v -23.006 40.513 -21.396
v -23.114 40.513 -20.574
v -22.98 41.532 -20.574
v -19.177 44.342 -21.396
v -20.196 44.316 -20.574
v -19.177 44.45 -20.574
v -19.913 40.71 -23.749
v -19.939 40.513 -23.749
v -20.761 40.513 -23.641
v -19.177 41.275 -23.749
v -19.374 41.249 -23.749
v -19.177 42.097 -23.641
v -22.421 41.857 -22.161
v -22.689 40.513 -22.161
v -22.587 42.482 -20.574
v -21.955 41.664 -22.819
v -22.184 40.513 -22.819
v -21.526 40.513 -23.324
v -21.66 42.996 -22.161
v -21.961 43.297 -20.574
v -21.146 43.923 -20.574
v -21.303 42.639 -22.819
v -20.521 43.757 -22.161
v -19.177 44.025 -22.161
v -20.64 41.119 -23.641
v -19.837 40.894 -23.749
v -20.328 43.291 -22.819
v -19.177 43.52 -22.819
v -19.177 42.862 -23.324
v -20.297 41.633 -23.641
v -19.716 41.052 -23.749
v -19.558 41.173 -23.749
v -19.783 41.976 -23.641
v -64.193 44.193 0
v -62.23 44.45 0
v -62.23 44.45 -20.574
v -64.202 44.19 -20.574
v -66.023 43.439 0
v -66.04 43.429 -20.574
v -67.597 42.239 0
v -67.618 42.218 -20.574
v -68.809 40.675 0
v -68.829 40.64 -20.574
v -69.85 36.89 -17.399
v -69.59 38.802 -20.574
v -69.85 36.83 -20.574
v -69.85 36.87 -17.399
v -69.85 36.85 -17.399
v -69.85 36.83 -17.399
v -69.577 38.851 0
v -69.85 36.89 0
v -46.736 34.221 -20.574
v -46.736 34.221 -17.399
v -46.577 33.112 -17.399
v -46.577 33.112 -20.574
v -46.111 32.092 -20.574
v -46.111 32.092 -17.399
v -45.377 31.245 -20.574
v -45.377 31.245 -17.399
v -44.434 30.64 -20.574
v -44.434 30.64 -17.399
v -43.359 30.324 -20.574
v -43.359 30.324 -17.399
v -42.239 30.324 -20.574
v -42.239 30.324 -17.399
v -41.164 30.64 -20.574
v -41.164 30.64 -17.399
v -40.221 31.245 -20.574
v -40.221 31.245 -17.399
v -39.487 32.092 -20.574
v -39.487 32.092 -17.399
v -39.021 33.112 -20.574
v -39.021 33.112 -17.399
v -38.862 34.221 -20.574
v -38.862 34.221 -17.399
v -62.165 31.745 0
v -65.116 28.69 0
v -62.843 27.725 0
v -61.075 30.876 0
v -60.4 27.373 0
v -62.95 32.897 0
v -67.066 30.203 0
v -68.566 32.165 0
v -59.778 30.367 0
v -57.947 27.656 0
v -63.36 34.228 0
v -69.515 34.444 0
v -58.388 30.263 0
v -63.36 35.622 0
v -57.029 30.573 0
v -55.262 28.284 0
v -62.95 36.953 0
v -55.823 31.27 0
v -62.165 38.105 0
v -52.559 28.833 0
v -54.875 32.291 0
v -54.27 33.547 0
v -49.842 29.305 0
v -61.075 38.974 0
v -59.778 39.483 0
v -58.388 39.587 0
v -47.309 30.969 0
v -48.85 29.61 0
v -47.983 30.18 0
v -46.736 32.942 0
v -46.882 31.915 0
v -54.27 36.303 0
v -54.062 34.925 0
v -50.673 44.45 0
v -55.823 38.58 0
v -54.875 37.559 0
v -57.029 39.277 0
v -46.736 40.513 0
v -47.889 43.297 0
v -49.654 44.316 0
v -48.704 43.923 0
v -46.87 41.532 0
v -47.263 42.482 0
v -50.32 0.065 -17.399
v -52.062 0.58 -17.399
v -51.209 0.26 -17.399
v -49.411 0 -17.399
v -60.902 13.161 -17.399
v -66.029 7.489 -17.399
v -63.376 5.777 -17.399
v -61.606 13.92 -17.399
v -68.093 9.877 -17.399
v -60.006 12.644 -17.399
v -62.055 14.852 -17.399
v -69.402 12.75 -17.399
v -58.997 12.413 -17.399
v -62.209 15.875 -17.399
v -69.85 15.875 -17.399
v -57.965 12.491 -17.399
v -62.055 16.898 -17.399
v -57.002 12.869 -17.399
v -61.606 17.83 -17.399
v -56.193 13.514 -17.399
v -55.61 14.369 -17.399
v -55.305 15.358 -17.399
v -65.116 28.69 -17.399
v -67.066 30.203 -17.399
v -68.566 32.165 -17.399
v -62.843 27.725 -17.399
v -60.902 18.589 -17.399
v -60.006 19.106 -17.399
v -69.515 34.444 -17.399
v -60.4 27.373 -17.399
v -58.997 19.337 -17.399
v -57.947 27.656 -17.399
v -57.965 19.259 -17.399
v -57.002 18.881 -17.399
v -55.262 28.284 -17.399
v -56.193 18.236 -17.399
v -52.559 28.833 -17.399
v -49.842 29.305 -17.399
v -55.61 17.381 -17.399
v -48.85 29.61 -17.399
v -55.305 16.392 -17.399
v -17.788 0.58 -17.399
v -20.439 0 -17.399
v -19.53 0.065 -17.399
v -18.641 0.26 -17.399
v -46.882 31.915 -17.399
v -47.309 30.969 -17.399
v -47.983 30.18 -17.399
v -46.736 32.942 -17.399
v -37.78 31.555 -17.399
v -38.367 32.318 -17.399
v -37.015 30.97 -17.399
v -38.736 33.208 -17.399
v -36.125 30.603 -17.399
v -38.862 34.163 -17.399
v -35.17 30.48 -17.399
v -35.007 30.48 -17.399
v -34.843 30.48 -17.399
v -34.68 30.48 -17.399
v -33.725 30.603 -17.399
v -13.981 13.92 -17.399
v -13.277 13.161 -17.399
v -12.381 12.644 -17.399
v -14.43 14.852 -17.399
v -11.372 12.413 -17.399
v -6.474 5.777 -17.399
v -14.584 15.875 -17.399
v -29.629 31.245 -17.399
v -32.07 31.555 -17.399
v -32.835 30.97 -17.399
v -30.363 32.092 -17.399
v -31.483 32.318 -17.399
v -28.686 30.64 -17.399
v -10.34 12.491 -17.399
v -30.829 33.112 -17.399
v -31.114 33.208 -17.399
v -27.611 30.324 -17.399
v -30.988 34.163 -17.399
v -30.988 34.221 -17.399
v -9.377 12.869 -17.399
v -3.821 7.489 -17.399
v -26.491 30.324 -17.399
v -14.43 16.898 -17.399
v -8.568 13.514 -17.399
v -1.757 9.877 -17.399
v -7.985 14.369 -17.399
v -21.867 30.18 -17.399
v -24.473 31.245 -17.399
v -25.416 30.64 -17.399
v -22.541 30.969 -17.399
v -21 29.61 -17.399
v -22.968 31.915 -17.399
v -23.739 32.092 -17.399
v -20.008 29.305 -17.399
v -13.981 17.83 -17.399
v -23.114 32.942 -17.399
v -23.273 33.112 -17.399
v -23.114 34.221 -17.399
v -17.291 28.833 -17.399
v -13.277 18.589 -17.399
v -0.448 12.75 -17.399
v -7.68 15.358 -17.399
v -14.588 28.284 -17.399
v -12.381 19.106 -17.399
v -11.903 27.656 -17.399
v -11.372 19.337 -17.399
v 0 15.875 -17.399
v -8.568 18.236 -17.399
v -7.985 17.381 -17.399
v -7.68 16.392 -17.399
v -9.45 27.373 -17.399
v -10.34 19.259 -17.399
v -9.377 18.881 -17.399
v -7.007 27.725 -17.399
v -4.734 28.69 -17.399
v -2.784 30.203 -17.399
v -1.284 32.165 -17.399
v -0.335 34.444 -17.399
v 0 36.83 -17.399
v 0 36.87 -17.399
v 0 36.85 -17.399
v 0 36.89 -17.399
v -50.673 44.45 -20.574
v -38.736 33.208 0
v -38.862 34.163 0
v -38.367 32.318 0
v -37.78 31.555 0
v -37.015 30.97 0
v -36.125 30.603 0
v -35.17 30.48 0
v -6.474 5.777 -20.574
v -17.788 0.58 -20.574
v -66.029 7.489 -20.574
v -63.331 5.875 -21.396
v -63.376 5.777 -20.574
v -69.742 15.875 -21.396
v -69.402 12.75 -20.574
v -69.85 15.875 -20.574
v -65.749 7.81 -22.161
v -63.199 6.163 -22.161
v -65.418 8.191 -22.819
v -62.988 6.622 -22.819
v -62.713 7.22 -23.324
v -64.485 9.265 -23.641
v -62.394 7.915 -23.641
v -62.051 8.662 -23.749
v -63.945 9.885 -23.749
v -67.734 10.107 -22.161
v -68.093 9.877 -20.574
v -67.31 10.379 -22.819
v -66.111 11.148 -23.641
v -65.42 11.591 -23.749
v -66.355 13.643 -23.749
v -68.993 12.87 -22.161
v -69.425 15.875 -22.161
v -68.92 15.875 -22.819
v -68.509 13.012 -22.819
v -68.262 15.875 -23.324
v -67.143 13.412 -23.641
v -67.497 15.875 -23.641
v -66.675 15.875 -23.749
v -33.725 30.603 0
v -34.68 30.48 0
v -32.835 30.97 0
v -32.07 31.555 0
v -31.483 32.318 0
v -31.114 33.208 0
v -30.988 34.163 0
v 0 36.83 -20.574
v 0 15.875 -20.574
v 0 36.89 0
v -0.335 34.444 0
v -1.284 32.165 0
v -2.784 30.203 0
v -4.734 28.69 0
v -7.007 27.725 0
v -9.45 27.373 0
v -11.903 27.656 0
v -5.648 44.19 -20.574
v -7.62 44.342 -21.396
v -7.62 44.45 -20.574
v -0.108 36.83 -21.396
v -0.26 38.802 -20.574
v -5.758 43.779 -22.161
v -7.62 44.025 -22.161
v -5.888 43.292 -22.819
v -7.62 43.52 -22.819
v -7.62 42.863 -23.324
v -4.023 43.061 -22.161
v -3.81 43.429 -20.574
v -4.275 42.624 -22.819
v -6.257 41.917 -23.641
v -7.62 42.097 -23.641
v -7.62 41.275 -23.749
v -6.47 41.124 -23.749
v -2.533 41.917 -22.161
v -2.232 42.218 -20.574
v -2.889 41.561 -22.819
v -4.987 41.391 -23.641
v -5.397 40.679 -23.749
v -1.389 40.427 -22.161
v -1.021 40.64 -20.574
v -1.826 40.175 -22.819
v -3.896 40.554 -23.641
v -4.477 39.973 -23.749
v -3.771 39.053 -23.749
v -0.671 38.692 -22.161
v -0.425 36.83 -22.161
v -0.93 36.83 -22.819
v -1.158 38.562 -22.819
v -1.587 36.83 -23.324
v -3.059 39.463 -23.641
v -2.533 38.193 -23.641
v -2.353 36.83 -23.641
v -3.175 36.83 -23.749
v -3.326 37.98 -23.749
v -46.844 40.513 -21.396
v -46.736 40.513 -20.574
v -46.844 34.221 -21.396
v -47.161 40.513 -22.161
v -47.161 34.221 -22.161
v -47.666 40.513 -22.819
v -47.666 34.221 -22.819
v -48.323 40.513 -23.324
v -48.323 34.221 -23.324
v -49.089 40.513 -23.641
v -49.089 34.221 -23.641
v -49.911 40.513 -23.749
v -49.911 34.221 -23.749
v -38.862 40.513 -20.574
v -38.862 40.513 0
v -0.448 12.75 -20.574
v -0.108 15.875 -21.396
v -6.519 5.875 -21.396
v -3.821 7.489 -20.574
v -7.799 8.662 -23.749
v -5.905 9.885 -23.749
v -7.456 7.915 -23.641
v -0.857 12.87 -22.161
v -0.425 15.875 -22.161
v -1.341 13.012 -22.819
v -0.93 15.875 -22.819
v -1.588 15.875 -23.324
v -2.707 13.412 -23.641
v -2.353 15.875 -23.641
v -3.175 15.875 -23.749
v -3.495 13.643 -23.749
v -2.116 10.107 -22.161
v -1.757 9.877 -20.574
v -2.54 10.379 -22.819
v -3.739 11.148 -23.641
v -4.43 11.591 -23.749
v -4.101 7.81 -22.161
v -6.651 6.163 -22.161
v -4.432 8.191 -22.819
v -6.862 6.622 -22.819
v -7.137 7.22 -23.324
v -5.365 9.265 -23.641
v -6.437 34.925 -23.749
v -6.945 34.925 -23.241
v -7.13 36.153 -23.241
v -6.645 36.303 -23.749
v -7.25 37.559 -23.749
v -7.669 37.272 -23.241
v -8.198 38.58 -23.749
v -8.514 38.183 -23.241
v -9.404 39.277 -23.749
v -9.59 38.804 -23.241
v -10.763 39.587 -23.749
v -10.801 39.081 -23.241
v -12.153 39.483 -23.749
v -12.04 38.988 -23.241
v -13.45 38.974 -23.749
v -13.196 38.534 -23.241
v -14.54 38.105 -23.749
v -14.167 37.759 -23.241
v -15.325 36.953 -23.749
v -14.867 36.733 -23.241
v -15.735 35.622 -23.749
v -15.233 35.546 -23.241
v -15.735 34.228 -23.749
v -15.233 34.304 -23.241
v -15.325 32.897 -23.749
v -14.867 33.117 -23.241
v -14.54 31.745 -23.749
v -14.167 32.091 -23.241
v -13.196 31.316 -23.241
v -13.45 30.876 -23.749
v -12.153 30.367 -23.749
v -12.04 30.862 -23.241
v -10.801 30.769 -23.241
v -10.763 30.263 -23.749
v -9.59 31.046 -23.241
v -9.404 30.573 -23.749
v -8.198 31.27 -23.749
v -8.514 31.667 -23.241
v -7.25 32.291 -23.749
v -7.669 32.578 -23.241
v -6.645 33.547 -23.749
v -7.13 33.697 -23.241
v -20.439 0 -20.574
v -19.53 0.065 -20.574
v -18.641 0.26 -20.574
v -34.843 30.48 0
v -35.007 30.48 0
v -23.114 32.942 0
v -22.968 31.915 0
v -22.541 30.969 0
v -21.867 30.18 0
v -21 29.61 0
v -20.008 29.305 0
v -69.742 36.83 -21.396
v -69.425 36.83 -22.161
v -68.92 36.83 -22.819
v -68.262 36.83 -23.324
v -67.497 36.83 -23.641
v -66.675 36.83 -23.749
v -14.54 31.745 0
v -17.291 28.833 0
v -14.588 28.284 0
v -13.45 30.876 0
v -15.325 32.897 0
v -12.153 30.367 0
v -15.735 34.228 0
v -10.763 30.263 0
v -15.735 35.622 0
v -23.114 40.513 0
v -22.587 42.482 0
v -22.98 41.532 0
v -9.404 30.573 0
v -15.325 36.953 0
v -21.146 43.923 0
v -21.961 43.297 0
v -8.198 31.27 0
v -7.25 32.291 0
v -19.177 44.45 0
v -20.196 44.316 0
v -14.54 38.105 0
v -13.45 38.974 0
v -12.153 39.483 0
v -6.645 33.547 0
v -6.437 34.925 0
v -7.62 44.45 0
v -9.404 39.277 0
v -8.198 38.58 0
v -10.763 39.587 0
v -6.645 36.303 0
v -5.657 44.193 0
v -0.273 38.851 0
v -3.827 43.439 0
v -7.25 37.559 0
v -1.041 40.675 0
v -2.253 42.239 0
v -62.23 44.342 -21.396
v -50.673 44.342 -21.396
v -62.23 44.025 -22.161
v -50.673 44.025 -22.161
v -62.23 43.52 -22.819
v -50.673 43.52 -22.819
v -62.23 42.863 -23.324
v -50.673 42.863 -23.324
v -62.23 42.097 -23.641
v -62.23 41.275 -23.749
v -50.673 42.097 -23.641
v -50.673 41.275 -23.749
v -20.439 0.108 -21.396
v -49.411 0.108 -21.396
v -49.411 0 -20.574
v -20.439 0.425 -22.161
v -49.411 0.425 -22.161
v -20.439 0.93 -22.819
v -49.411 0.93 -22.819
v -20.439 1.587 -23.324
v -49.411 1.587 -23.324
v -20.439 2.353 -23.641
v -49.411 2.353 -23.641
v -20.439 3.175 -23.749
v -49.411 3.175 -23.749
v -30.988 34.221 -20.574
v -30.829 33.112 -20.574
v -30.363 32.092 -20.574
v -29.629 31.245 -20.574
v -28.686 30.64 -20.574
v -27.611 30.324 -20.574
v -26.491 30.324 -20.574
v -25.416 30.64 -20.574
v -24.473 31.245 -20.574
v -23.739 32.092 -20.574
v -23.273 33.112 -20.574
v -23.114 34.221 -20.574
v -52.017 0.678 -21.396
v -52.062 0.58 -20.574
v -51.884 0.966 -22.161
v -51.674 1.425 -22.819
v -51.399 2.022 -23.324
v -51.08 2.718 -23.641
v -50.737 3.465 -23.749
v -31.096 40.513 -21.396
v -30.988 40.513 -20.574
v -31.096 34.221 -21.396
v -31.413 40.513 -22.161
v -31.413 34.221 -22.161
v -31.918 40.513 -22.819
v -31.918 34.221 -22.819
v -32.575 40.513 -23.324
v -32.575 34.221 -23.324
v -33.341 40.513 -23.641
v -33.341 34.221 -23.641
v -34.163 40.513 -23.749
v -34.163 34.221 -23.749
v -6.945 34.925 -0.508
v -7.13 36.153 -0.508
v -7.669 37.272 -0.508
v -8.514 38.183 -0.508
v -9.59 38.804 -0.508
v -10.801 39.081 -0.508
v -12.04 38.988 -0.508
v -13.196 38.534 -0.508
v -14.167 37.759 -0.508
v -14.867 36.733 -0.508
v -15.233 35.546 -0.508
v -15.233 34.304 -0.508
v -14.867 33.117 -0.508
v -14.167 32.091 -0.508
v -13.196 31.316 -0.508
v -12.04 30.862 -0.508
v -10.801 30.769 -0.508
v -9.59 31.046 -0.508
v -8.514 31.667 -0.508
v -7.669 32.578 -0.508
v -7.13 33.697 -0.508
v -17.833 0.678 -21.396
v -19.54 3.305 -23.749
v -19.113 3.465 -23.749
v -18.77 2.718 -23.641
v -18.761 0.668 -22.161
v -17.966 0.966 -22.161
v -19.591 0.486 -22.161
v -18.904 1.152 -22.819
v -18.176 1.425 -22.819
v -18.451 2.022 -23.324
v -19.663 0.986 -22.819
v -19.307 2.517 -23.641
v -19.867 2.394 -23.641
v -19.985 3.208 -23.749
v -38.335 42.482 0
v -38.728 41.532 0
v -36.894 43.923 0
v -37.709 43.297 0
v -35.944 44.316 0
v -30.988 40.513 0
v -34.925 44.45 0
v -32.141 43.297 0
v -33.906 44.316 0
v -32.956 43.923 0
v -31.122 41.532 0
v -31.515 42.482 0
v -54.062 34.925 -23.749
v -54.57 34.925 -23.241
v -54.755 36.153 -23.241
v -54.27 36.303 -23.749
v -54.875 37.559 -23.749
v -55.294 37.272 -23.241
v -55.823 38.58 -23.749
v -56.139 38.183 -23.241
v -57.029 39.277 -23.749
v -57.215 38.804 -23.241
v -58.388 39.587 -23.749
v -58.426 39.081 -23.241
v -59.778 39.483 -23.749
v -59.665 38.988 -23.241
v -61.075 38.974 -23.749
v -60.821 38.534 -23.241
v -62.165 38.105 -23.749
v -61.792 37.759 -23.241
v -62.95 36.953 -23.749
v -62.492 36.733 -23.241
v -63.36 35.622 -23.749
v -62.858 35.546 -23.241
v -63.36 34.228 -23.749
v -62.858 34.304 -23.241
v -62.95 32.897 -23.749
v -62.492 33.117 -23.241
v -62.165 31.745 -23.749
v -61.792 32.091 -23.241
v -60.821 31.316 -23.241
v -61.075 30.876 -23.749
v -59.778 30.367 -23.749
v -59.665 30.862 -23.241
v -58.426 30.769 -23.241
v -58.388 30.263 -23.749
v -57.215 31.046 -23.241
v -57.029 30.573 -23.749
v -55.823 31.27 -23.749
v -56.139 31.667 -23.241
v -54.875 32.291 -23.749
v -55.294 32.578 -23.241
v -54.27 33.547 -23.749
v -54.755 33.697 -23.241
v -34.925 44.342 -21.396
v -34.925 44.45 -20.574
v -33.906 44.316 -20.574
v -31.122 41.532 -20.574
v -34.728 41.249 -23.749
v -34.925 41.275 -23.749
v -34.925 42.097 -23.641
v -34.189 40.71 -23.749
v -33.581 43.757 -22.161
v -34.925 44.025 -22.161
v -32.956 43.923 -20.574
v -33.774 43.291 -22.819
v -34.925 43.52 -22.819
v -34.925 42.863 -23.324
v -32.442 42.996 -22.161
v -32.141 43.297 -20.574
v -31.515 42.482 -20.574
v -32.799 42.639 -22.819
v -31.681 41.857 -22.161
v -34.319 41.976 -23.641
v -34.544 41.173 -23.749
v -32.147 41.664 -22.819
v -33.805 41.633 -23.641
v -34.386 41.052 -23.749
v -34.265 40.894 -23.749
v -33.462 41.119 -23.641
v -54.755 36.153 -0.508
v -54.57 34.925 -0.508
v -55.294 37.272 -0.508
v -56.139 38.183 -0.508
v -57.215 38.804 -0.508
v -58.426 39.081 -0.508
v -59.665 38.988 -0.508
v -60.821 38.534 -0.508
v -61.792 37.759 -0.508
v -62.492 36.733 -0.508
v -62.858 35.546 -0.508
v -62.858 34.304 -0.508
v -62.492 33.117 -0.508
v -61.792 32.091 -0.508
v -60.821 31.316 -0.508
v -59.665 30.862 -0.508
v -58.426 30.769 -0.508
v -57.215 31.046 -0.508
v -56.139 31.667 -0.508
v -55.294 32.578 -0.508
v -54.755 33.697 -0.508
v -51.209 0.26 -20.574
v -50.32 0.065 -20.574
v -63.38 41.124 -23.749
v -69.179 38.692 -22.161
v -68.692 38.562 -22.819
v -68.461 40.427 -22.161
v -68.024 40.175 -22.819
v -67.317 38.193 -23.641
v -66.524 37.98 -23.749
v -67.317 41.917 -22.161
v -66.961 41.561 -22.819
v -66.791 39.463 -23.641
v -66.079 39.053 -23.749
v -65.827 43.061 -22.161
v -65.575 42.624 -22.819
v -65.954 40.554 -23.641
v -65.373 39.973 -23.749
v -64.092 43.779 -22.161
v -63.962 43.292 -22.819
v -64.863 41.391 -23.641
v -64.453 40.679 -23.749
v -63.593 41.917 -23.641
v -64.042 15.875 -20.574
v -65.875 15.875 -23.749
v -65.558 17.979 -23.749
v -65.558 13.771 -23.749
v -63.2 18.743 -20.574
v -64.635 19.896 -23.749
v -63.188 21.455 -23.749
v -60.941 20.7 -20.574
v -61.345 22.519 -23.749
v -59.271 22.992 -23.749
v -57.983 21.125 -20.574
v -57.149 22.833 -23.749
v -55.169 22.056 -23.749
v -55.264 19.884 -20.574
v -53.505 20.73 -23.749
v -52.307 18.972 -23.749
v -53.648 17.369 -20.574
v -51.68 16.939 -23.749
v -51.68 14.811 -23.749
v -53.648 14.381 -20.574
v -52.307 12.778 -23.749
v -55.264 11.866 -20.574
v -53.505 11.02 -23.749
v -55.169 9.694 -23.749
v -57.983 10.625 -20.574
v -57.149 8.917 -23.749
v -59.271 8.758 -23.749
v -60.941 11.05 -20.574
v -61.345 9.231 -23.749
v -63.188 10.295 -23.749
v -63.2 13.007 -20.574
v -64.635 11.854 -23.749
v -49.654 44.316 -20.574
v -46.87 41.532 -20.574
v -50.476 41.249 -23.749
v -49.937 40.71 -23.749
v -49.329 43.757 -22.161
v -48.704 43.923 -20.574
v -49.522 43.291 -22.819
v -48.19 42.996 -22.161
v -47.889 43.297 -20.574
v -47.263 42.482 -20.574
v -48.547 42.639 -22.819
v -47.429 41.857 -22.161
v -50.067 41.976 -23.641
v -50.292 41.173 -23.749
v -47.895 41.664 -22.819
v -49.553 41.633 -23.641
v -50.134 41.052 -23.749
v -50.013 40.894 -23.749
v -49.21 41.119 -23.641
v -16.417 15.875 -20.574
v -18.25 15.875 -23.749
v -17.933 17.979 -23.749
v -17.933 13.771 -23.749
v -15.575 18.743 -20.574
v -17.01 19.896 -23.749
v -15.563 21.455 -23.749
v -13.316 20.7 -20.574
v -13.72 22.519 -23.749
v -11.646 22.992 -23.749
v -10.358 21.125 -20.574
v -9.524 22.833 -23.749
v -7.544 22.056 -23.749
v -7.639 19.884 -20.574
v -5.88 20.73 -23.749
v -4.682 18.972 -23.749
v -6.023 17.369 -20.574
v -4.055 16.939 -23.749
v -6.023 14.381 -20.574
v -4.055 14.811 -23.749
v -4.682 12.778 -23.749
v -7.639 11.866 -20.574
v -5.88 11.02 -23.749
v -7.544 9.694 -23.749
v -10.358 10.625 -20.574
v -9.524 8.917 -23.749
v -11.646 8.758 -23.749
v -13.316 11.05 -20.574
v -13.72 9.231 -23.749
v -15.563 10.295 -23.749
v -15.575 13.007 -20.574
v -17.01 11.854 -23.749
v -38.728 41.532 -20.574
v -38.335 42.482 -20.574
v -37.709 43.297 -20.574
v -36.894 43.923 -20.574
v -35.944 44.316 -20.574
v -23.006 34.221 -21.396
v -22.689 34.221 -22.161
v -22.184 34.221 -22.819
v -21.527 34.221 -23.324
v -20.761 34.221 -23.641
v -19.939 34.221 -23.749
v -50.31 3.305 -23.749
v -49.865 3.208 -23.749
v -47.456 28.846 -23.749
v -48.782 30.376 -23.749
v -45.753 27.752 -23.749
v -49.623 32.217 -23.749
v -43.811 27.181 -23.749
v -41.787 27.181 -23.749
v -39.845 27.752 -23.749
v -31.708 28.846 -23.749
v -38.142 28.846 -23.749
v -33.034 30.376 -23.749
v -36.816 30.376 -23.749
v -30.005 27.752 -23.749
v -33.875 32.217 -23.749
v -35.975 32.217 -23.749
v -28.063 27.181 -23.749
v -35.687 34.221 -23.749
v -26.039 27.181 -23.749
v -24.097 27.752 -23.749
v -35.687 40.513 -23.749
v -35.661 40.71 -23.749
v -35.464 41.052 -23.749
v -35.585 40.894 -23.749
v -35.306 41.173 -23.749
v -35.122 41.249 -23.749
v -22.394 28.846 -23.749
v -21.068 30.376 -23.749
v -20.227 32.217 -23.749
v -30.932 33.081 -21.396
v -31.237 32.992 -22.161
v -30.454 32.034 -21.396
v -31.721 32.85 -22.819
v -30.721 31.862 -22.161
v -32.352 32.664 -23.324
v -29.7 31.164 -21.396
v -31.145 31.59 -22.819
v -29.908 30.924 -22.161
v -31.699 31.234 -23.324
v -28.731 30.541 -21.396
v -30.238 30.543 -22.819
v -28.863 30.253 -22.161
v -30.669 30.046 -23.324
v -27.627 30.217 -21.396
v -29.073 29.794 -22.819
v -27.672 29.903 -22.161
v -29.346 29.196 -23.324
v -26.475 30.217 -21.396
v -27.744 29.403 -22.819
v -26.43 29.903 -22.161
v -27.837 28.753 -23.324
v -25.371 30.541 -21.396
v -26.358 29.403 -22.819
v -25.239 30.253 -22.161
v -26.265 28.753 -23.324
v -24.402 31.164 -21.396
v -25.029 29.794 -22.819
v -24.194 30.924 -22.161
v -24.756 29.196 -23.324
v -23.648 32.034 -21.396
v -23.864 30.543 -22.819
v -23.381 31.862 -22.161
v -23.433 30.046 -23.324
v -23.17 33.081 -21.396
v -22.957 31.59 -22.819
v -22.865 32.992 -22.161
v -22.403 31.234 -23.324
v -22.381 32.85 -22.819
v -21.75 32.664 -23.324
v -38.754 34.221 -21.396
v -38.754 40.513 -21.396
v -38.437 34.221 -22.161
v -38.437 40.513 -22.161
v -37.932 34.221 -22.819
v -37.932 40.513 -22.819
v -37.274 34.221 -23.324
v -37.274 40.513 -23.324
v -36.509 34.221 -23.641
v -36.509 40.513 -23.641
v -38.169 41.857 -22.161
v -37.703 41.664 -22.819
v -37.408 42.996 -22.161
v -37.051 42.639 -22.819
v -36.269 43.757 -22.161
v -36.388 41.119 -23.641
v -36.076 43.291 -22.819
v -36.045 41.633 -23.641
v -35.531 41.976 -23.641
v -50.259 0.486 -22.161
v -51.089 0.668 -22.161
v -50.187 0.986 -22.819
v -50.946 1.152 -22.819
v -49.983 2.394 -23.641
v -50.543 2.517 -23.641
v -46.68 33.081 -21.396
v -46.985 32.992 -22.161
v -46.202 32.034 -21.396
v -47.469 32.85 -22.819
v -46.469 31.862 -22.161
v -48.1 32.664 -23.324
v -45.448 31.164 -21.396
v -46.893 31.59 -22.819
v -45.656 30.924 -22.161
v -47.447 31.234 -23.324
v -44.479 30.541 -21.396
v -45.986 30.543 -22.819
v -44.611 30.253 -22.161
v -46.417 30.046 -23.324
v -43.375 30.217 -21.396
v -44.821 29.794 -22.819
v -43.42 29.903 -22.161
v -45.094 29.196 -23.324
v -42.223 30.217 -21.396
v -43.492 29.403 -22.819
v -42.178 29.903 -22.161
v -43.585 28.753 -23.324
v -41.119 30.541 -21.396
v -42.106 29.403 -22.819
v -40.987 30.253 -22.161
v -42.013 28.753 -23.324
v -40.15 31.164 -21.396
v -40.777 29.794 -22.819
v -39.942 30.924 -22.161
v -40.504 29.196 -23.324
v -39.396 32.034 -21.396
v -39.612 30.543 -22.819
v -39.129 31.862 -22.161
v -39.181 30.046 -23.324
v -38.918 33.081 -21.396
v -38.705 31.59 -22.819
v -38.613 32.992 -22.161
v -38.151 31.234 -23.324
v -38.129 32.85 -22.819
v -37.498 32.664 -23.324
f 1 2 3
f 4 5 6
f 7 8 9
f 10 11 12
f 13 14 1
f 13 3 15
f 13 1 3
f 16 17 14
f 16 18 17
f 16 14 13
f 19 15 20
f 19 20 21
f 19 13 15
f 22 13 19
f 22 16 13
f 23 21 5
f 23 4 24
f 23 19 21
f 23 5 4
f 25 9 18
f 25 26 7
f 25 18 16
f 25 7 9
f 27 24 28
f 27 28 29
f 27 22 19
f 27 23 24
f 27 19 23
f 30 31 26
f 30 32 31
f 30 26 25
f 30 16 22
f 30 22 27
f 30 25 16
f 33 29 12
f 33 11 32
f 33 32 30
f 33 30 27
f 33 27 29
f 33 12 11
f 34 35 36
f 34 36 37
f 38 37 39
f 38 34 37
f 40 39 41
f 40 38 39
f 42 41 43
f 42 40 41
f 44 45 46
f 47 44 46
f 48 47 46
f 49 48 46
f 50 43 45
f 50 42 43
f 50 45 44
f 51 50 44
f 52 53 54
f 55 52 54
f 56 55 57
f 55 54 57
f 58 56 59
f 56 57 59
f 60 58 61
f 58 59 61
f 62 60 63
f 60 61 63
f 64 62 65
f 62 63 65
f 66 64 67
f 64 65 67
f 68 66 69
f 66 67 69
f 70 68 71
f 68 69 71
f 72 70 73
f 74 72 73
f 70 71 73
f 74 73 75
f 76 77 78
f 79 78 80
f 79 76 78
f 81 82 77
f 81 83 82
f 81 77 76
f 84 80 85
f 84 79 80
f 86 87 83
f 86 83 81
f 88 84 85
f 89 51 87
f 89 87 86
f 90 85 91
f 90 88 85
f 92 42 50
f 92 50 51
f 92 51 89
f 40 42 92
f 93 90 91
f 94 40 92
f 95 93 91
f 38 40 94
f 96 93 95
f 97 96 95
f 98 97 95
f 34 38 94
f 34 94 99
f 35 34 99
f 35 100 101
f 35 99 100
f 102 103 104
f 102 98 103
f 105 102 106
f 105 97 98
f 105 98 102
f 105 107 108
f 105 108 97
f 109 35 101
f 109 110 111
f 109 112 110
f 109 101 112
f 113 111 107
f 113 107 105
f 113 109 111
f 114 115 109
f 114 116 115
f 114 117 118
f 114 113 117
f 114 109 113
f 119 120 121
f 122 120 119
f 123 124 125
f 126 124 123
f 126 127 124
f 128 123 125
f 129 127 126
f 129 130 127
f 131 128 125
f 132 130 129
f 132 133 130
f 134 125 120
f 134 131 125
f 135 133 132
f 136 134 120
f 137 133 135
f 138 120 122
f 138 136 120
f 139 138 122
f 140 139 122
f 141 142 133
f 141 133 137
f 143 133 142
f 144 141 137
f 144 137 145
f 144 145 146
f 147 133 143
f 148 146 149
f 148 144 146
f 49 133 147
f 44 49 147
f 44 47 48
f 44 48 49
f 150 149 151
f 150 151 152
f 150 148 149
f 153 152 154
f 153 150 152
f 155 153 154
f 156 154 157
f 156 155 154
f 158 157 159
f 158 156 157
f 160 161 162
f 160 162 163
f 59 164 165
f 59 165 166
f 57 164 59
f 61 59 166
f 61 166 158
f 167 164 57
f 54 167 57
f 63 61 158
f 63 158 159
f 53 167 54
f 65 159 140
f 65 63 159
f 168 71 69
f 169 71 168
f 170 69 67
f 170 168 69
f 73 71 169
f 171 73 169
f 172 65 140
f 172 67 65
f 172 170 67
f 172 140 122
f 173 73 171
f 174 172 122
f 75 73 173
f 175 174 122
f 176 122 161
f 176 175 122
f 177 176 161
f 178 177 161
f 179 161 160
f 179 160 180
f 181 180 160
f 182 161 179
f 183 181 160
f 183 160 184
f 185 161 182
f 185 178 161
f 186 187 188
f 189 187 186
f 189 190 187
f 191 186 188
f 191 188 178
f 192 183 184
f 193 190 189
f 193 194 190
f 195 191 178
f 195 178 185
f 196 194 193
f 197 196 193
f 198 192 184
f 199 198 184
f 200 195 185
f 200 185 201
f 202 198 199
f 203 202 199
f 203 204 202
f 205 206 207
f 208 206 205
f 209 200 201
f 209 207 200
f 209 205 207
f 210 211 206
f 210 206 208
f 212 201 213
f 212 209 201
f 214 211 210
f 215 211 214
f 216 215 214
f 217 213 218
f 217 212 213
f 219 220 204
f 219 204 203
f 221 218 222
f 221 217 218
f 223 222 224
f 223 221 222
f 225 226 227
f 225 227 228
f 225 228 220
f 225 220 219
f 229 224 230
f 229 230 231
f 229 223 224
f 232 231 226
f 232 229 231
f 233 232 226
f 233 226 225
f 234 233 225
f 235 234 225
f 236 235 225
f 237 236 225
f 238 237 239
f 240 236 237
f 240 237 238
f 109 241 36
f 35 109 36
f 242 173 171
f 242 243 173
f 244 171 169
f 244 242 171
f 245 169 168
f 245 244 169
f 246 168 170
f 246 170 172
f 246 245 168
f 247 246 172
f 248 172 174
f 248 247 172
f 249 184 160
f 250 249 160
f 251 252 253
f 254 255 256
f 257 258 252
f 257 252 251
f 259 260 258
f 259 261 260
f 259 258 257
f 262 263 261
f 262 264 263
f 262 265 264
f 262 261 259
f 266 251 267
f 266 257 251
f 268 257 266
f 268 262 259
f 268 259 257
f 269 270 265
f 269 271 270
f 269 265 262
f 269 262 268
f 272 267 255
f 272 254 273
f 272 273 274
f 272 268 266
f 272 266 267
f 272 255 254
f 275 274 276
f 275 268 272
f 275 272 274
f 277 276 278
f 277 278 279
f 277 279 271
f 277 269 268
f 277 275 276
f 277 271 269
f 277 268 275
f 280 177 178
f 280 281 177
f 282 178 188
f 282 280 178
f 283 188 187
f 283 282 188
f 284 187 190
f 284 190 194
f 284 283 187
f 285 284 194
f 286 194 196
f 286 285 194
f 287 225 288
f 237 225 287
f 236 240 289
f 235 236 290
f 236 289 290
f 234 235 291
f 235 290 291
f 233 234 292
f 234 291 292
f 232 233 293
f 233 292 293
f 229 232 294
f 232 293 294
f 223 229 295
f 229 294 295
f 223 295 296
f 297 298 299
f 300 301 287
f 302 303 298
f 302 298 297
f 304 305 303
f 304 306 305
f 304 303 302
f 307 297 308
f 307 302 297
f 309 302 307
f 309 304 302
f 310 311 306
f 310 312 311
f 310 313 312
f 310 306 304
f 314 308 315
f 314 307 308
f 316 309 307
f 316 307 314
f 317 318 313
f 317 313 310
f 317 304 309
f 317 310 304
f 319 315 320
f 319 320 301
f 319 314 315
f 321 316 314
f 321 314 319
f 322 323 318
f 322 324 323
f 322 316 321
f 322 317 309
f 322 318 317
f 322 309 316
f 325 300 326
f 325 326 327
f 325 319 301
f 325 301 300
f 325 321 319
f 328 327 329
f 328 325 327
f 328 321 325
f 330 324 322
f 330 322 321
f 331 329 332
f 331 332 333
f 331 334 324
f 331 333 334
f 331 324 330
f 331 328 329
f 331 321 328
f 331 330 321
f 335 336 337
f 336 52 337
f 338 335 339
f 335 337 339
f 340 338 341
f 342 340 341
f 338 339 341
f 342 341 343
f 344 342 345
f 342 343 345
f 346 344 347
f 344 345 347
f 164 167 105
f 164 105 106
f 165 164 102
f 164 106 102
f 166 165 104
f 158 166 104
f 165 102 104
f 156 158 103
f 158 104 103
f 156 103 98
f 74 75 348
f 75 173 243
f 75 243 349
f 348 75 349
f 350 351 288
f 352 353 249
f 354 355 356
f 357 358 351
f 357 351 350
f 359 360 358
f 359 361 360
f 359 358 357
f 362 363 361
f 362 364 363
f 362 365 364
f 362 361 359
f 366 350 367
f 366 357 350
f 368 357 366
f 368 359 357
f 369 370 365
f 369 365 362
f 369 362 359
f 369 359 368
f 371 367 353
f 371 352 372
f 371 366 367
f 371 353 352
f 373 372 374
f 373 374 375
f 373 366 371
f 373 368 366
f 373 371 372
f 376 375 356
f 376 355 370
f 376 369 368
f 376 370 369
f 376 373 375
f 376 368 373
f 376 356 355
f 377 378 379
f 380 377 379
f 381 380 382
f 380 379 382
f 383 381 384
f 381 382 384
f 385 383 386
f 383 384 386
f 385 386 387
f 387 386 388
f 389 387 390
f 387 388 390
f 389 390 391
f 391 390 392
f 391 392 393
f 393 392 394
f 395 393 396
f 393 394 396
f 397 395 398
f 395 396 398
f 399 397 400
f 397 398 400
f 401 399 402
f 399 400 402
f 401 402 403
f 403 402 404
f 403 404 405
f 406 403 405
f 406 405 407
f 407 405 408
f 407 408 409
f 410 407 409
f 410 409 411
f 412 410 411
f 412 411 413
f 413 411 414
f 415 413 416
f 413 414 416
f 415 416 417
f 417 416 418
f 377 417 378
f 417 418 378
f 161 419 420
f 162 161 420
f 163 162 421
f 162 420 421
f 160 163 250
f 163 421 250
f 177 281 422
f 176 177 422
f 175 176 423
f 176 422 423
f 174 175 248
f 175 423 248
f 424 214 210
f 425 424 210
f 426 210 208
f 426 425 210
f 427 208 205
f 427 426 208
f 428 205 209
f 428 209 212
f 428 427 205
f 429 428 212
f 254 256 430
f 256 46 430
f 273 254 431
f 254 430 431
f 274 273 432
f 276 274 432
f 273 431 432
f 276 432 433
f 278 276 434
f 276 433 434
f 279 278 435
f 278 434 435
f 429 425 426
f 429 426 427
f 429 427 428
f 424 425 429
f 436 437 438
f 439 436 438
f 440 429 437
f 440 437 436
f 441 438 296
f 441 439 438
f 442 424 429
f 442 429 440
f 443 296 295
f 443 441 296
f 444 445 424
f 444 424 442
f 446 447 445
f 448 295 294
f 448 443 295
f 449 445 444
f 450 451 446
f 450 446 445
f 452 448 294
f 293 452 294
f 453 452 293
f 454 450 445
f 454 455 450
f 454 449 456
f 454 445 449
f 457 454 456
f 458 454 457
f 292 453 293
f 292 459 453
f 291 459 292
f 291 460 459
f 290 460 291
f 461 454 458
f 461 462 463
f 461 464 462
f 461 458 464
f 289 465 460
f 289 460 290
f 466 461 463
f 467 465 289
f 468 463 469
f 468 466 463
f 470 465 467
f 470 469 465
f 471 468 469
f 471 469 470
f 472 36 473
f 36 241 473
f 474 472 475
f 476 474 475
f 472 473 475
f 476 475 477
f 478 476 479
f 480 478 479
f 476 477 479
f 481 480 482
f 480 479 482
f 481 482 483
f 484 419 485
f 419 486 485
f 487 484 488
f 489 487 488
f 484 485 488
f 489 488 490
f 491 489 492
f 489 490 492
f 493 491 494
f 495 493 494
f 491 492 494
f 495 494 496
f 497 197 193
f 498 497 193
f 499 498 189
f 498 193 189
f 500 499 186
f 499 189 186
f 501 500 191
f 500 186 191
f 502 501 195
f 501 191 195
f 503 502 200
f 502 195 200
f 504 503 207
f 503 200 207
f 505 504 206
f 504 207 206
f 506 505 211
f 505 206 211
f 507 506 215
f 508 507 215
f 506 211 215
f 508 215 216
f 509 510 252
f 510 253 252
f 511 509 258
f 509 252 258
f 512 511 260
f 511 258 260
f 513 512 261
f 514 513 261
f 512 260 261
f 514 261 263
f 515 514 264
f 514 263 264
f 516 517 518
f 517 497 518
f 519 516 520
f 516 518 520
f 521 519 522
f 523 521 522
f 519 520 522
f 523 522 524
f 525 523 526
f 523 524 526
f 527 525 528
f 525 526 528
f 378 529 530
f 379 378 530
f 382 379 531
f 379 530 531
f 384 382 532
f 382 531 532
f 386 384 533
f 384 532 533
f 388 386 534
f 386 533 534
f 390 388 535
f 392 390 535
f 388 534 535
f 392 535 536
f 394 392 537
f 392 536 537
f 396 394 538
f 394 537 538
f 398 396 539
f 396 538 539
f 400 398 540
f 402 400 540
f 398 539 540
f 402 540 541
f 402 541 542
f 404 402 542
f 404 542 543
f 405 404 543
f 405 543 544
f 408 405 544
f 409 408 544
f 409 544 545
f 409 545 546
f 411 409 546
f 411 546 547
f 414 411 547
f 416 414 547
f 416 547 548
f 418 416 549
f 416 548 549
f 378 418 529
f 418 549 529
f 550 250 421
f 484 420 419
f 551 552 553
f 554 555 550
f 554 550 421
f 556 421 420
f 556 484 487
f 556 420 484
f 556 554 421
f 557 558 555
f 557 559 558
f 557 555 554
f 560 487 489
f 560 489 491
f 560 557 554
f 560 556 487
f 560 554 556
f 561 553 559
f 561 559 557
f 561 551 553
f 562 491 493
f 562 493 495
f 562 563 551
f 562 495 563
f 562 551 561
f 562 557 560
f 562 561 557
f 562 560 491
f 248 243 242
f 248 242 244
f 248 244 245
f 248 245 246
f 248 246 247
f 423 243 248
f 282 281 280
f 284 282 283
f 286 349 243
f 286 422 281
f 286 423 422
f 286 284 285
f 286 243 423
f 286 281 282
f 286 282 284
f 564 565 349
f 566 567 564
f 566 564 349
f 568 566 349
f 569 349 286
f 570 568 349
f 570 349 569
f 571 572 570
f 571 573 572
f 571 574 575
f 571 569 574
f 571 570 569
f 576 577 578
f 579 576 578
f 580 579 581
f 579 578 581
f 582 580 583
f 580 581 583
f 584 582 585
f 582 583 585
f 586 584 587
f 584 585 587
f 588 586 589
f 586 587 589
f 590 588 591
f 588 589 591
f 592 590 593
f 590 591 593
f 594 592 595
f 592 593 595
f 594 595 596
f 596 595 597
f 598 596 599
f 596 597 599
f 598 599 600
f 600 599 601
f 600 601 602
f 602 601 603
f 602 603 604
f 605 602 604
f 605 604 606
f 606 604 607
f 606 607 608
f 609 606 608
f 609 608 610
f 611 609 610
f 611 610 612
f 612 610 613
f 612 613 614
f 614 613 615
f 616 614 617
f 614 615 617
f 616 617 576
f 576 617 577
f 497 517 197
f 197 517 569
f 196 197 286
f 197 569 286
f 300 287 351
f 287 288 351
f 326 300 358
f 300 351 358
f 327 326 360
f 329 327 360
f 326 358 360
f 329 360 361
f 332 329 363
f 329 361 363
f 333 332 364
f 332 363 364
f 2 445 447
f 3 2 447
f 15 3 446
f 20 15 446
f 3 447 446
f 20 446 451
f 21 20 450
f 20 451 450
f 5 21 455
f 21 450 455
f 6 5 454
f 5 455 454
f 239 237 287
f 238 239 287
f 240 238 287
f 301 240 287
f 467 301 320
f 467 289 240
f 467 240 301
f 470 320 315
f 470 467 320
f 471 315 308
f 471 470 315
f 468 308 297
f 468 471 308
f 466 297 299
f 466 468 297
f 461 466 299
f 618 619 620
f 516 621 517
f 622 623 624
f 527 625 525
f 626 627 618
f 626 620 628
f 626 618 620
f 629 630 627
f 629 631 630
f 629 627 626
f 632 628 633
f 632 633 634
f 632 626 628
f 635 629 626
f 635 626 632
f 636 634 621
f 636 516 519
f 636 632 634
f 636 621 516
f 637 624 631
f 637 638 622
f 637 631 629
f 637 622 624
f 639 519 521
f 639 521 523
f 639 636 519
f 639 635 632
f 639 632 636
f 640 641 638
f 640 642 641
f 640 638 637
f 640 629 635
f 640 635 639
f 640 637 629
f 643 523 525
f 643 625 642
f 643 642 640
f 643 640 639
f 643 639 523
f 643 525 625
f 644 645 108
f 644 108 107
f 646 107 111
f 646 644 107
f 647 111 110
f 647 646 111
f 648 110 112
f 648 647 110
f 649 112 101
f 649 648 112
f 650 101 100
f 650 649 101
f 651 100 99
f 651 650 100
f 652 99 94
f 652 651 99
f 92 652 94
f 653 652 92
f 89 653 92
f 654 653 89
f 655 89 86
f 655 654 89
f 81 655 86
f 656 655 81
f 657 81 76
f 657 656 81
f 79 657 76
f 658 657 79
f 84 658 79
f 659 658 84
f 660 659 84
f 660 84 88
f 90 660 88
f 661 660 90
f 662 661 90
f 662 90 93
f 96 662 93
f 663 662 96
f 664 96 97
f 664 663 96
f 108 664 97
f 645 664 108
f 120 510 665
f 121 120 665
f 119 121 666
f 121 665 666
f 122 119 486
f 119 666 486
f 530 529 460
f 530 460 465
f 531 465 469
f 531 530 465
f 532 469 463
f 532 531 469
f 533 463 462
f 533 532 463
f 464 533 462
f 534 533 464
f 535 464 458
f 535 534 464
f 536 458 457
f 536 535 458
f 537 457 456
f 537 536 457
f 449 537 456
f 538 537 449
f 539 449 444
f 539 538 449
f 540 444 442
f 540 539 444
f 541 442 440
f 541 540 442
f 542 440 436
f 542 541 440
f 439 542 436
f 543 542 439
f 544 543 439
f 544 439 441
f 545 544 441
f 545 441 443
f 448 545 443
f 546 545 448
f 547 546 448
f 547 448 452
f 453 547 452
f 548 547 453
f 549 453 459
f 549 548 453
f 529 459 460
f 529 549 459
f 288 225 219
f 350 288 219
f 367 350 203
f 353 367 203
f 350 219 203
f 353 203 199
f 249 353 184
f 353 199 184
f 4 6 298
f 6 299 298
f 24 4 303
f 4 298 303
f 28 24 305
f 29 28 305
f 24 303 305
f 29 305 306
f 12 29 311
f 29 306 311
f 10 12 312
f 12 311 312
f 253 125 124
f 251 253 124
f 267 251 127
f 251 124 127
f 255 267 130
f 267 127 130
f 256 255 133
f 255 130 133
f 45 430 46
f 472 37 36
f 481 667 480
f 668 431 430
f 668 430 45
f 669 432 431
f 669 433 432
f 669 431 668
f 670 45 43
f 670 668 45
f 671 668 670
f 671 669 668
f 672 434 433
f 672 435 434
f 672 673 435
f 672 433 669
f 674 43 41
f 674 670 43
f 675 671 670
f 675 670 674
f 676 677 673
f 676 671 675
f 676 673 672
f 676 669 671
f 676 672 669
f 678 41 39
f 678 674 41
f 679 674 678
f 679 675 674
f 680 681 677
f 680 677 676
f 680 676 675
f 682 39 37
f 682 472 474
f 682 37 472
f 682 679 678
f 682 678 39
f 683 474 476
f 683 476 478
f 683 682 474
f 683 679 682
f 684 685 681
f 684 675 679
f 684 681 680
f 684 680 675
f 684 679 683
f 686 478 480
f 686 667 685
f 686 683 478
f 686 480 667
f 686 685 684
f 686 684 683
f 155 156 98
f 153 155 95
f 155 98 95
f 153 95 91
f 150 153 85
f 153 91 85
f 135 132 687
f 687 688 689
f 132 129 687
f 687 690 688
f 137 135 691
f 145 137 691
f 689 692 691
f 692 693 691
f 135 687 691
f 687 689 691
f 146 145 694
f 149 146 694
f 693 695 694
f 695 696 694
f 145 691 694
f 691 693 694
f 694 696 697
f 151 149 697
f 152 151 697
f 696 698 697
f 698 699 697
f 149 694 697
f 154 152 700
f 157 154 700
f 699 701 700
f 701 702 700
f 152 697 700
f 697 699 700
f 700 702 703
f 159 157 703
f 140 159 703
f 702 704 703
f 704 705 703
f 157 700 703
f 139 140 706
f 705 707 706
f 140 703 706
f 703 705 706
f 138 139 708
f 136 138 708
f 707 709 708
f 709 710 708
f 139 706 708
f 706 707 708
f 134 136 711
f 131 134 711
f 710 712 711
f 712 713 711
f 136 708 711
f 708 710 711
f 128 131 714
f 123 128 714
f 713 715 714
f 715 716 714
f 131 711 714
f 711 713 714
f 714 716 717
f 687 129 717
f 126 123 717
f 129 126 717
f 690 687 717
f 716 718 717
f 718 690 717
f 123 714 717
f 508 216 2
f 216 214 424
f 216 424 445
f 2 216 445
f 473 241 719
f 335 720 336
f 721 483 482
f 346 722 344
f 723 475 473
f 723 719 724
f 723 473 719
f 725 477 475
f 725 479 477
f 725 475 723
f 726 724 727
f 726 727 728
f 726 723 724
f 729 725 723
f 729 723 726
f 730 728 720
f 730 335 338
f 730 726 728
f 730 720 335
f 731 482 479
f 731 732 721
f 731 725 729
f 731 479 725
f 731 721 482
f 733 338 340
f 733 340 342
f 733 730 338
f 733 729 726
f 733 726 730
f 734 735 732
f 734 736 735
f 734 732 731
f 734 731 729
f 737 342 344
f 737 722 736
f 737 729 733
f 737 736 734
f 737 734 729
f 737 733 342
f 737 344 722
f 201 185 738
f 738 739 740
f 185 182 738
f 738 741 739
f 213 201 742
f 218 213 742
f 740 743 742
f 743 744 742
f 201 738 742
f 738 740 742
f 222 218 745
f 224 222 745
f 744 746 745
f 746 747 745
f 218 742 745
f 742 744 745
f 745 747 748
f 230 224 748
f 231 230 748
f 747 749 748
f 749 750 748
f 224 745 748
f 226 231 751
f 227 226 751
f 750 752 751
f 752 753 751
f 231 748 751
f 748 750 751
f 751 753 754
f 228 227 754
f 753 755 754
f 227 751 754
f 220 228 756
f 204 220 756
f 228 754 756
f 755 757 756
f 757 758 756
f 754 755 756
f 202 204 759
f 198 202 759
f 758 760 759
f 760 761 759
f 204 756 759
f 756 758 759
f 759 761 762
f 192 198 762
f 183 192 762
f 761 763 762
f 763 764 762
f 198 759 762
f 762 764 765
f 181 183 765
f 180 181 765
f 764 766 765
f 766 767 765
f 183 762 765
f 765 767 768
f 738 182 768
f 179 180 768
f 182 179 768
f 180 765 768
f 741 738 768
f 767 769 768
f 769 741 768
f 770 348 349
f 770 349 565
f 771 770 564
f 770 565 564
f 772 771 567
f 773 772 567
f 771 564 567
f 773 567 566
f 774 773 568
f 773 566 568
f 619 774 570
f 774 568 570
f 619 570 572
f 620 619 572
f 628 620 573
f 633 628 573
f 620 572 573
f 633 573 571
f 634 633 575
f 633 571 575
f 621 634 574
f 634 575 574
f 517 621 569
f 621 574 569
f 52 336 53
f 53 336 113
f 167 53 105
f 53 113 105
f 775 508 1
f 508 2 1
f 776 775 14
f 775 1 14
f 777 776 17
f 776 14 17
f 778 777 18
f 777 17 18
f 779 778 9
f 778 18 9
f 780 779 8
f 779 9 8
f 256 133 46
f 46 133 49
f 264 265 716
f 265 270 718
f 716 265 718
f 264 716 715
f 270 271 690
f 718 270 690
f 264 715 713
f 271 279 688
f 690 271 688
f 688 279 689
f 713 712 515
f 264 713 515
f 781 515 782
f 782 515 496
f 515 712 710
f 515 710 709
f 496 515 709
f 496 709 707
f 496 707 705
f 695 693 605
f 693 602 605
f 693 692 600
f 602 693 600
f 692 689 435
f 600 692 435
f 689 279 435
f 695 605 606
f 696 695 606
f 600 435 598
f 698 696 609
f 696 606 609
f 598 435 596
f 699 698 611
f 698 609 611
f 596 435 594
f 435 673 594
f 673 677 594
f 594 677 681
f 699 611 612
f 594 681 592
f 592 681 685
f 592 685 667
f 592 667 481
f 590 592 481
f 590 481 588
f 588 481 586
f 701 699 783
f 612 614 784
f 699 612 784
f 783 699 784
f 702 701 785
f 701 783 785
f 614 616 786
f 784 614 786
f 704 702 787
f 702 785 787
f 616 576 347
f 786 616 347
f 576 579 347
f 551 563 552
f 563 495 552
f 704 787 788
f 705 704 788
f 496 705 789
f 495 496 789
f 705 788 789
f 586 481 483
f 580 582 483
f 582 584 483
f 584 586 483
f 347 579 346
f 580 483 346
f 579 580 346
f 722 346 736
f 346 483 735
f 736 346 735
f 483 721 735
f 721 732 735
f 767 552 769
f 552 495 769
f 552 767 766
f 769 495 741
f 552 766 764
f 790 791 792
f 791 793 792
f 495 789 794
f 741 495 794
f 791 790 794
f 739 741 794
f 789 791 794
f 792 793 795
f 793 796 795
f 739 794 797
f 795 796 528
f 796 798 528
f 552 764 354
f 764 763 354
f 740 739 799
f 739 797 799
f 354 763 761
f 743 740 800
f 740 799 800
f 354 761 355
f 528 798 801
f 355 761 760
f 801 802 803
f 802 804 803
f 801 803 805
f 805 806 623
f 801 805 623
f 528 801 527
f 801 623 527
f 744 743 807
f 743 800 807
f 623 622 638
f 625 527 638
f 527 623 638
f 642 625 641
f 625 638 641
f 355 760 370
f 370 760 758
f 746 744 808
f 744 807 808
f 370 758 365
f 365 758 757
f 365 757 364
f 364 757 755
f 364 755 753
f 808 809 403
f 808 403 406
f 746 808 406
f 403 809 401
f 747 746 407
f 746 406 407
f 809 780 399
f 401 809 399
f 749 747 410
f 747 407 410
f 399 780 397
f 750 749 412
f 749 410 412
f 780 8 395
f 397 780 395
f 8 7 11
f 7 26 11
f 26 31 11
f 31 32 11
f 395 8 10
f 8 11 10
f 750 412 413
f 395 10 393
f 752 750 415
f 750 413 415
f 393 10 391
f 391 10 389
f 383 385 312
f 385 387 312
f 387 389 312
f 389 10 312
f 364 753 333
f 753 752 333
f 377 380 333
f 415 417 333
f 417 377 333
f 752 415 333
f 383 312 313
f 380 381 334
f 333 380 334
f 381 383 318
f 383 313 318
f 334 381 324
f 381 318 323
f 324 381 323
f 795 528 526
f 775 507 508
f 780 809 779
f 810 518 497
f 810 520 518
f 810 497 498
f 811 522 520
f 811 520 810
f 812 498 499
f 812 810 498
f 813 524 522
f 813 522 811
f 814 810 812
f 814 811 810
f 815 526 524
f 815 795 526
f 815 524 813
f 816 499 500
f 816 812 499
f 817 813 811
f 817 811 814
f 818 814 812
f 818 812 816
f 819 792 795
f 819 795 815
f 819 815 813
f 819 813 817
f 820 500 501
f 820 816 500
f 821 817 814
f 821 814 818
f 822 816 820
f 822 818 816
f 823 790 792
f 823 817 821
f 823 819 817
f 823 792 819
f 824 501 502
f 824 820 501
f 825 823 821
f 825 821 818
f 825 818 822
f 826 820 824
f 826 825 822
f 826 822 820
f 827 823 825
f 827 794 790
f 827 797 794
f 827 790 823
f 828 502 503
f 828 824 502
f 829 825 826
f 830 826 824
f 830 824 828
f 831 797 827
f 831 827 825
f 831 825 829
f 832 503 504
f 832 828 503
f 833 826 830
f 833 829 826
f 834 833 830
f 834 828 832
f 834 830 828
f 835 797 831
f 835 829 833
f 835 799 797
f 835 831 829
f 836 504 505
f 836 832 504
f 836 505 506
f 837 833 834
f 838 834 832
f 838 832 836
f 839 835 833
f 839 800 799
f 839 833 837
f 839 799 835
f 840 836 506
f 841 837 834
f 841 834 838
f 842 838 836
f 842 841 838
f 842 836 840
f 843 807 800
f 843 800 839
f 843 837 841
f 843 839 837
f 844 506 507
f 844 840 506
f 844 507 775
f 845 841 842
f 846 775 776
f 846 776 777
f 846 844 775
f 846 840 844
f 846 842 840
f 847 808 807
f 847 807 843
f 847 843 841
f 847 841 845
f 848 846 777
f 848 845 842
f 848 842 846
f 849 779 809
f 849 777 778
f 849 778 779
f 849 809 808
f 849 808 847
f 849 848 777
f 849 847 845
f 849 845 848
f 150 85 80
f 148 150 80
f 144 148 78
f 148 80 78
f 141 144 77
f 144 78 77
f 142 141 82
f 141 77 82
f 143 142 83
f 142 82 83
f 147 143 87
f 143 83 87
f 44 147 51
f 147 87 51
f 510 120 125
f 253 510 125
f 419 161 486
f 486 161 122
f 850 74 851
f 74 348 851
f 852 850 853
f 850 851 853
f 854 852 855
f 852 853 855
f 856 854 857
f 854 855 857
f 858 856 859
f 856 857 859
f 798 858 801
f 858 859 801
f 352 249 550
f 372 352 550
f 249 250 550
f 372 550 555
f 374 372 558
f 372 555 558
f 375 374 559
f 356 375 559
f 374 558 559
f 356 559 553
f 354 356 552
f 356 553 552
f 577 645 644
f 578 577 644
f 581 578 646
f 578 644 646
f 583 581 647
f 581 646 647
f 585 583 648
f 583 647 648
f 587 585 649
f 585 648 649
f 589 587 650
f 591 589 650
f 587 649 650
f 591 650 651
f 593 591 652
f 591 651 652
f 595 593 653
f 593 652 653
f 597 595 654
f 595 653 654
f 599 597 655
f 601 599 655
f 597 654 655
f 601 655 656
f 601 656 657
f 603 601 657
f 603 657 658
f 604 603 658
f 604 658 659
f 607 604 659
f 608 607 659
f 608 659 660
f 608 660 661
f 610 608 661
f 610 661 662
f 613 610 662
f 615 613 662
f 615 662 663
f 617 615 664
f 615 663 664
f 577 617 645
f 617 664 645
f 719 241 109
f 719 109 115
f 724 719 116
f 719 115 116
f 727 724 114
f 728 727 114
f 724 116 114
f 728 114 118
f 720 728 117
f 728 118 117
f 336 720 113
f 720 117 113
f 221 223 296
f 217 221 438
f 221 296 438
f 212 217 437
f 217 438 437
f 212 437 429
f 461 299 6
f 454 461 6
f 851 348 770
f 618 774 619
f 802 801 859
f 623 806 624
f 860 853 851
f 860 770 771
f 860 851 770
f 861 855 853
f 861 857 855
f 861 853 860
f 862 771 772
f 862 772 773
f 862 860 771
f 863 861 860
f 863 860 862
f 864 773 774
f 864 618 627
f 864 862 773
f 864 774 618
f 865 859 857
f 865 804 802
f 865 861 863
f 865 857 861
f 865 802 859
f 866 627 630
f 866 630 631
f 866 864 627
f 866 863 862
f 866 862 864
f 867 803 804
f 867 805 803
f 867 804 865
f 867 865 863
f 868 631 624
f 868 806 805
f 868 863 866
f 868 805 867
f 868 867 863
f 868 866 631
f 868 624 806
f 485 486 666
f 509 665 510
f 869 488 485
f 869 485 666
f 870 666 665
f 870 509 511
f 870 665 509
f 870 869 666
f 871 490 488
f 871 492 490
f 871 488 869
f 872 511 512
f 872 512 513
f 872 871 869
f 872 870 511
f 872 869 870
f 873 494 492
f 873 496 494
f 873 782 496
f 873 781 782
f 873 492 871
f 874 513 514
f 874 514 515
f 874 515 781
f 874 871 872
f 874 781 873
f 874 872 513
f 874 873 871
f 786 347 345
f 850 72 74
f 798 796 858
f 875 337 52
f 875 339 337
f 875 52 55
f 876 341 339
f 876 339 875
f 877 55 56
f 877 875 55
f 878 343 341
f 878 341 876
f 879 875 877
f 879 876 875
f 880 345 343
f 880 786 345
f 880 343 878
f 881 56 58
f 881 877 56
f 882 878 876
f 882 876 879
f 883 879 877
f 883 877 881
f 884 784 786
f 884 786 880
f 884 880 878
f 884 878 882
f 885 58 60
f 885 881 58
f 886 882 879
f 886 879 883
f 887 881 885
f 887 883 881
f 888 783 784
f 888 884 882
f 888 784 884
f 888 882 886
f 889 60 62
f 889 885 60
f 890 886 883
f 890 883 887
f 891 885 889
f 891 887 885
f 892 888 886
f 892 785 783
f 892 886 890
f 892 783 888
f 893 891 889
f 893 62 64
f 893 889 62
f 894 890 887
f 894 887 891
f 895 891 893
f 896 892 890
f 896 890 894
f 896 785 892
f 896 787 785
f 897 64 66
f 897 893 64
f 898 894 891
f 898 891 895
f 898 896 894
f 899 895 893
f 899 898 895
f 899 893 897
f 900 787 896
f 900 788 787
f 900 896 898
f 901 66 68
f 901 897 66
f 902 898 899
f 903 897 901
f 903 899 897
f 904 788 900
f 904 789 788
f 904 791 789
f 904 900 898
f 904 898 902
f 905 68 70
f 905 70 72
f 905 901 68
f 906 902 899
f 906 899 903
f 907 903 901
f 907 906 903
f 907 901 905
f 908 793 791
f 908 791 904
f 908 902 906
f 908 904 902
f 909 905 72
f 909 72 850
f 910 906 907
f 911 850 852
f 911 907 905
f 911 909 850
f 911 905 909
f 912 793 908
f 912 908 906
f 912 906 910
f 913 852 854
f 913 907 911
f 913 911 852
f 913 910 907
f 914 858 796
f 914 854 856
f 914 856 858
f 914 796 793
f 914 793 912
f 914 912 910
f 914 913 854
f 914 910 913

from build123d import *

# Parameters (mm, degrees)
SKETCH1_W                    = 69.85
SKETCH1_H                    = 44.45
SKETCH1_R                    = 4.1671875
BOSS_EXTRUDE1_DEPTH          = 23.749
CUT_EXTRUDE1_DEPTH           = 17.399
SKETCH3_OUTSIDE_W            = 89.076
SKETCH3_OUTSIDE_H            = 63.676
CUT_EXTRUDE2_DEPTH           = 23.749
SKETCH4_OUTSIDE_W            = 89.076
SKETCH4_OUTSIDE_H            = 63.676
CUT_EXTRUDE3_DEPTH           = 6.35
CUT_EXTRUDE4_DEPTH           = 87.132688342
SKETCH6_R                    = 7.1374
CUT_EXTRUDE6_DEPTH           = 6.35
CUT_EXTRUDE6_DRAFT           = -30
CUT_EXTRUDE6_PROFILE_2_DEPTH = 6.35
CUT_EXTRUDE6_PROFILE_2_DRAFT = -30
SKETCH7_W                    = 7.874
SKETCH7_H                    = 9.578750354
CUT_EXTRUDE7_DEPTH           = 85.602306121
FILLET2_R                    = 3.683
CHAMFER1_SIZE                = 0.508
FILLET3_R                    = 6.35
FILLET4_R                    = 3.175


with BuildPart() as part:
    # Sketch1 → Boss-Extrude1 (new body)
    with BuildSketch(Plane.XY):
        with Locations((-34.925, 22.225)):
            Rectangle(SKETCH1_W, SKETCH1_H)
        with Locations((-58.7375, 34.925)):
            Circle(SKETCH1_R, mode=Mode.SUBTRACT)
        with Locations((-11.1125, 34.925)):
            Circle(SKETCH1_R, mode=Mode.SUBTRACT)
    extrude(amount=-BOSS_EXTRUDE1_DEPTH)

    # Sketch2 → Cut-Extrude1 (cut)
    with BuildSketch(Plane.XY):
        with BuildLine():
            Line((-69.85, 36.957634205), (-69.85, 0))
            Line((-69.85, 0), (-34.925, 0))
            Line((-34.925, 0), (0, 0))
            Line((0, 0), (0, 36.957634205))
            ThreePointArc((0, 36.957634205), (-3.683397045, 29.404464031), (-11.902903765, 27.655892395))
            ThreePointArc((-11.902903765, 27.655892395), (-34.925, 30.48), (-57.947096235, 27.655892395))
            ThreePointArc((-57.947096235, 27.655892395), (-66.166602955, 29.404464031), (-69.85, 36.957634205))
        make_face()
    extrude(amount=-CUT_EXTRUDE1_DEPTH, mode=Mode.SUBTRACT)

    # Sketch3 outside → Cut-Extrude2 (cut)
    with BuildSketch(Plane.XY):
        with Locations((-34.925, 22.225)):
            Rectangle(SKETCH3_OUTSIDE_W, SKETCH3_OUTSIDE_H)
        with BuildLine():
            Line((-69.85, 36.83), (-69.85, 0))
            Line((-69.85, 0), (0, 0))
            Line((0, 0), (0, 36.83))
            ThreePointArc((0, 36.83), (-2.231846327, 42.218153673), (-7.62, 44.45))
            Line((-7.62, 44.45), (-62.23, 44.45))
            ThreePointArc((-62.23, 44.45), (-67.618153673, 42.218153673), (-69.85, 36.83))
        make_face(mode=Mode.SUBTRACT)
    extrude(amount=-CUT_EXTRUDE2_DEPTH, mode=Mode.SUBTRACT)

    # Sketch4 outside → Cut-Extrude3 (cut)
    with BuildSketch(Plane.XY.offset(-17.399)):
        with Locations((-34.925, 22.225)):
            Rectangle(SKETCH4_OUTSIDE_W, SKETCH4_OUTSIDE_H)
        with BuildLine():
            Line((-69.85, 44.45), (0, 44.45))
            Line((0, 44.45), (0, 15.875))
            ThreePointArc((0, 15.875), (-1.757438621, 9.877460267), (-6.473877678, 5.776938839))
            Line((-6.473877678, 5.776938839), (-19.05, 0))
            Line((-19.05, 0), (-50.8, 0))
            Line((-50.8, 0), (-63.376122322, 5.776938839))
            ThreePointArc((-63.376122322, 5.776938839), (-68.092561379, 9.877460267), (-69.85, 15.875))
            Line((-69.85, 15.875), (-69.85, 44.45))
        make_face(mode=Mode.SUBTRACT)
    extrude(amount=-CUT_EXTRUDE3_DEPTH, mode=Mode.SUBTRACT)

    # Sketch5 → Cut-Extrude4 (cut, through all)
    with BuildSketch(Plane.XY):
        with BuildLine():
            Line((-38.862, 34.22084733), (-38.862, 40.513))
            ThreePointArc((-38.862, 40.513), (-37.708879398, 43.296879398), (-34.925, 44.45))
            Line((-34.925, 44.45), (-50.673, 44.45))
            ThreePointArc((-50.673, 44.45), (-47.889120602, 43.296879398), (-46.736, 40.513))
            Line((-46.736, 40.513), (-46.736, 34.22084733))
            ThreePointArc((-46.736, 34.22084733), (-42.799, 30.28384733), (-38.862, 34.22084733))
        make_face()
        with BuildLine():
            Line((-19.177, 44.45), (-34.925, 44.45))
            ThreePointArc((-34.925, 44.45), (-32.141120602, 43.296879398), (-30.988, 40.513))
            Line((-30.988, 40.513), (-30.988, 34.22084733))
            ThreePointArc((-30.988, 34.22084733), (-27.051, 30.28384733), (-23.114, 34.22084733))
            Line((-23.114, 34.22084733), (-23.114, 40.513))
            ThreePointArc((-23.114, 40.513), (-21.960879398, 43.296879398), (-19.177, 44.45))
        make_face()
    extrude(amount=-CUT_EXTRUDE4_DEPTH, mode=Mode.SUBTRACT)


with BuildPart() as cut_extrude6_tool:
    # Sketch6 → Cut-Extrude6 (with draft: the straight prism first)
    with BuildSketch(Plane(origin=(0, 0, -23.749), x_dir=(-1, 0, 0), z_dir=(0, 0, -1))):
        with Locations((11.1125, 15.875)):
            Circle(SKETCH6_R)
    extrude(amount=-CUT_EXTRUDE6_DEPTH)
    # Cut-Extrude6: the draft: its side faces are tilted about the plane it starts from
    cut_extrude6_sides = [cut_extrude6_tool.faces().sort_by_distance(p)[0] for p in [
        (-3.9751, 15.875, -20.574),
    ]]
    draft(cut_extrude6_sides, Plane(origin=(0, 0, -23.749), x_dir=(-1, 0, 0), z_dir=(0, 0, -1)), CUT_EXTRUDE6_DRAFT)


with BuildPart() as part_1:
    add(part.part)

    # Cut-Extrude6: cut by cut_extrude6_tool
    add(cut_extrude6_tool.part, mode=Mode.SUBTRACT)


with BuildPart() as cut_extrude6_profile_2_tool:
    # Sketch6 → Cut-Extrude6 profile 2 (with draft: the straight prism first)
    with BuildSketch(Plane(origin=(0, 0, -23.749), x_dir=(-1, 0, 0), z_dir=(0, 0, -1))):
        with Locations((58.7375, 15.875)):
            Circle(SKETCH6_R)
    extrude(amount=-CUT_EXTRUDE6_PROFILE_2_DEPTH)
    # Cut-Extrude6 profile 2: the draft: its side faces are tilted about the plane it starts from
    cut_extrude6_profile_2_sides = [cut_extrude6_profile_2_tool.faces().sort_by_distance(p)[0] for p in [
        (-51.6001, 15.875, -20.574),
    ]]
    draft(cut_extrude6_profile_2_sides, Plane(origin=(0, 0, -23.749), x_dir=(-1, 0, 0), z_dir=(0, 0, -1)), CUT_EXTRUDE6_PROFILE_2_DRAFT)


with BuildPart() as part_2:
    add(part_1.part)

    # Cut-Extrude6 profile 2: cut by cut_extrude6_profile_2_tool
    add(cut_extrude6_profile_2_tool.part, mode=Mode.SUBTRACT)

    # Sketch7 → Cut-Extrude7 (cut, through all)
    with BuildSketch(Plane.XY.offset(-17.399)):
        with Locations((-42.799, 32.577548488)):
            Rectangle(SKETCH7_W, SKETCH7_H)
        with Locations((-27.051, 32.577548488)):
            Rectangle(SKETCH7_W, SKETCH7_H)
    extrude(amount=CUT_EXTRUDE7_DEPTH, mode=Mode.SUBTRACT)

    # Fillet2
    fillet2_edges = [part_2.edges().sort_by_distance(p)[0] for p in [
        (-38.862, 30.398600552, -8.6995),
        (-46.736, 29.744881257, -8.6995),
        (-23.114, 29.744881257, -8.6995),
        (-30.988, 30.398600552, -8.6995),
    ]]
    fillet(fillet2_edges, radius=FILLET2_R)

    # Chamfer1
    chamfer1_edges = [part_2.edges().sort_by_distance(p)[0] for p in [
        (-62.9046875, 34.925, -23.749),
        (-62.9046875, 34.925, 0),
        (-15.2796875, 34.925, -23.749),
        (-15.2796875, 34.925, 0),
    ]]
    chamfer(chamfer1_edges, length=CHAMFER1_SIZE)

    # Fillet3
    fillet3_edges = [part_2.edges().sort_by_distance(p)[0] for p in [
        (-50.8, 0, -20.574),
        (-19.05, 0, -20.574),
    ]]
    fillet(fillet3_edges, radius=FILLET3_R)

    # Fillet4
    fillet4_edges = [part_2.edges().sort_by_distance(p)[0] for p in [
        (-1.757438621, 9.877460267, -23.749),
        (-68.092561379, 9.877460267, -23.749),
        (-12.130971605, 3.178309088, -23.749),
        (-56.4515, 44.45, -23.749),
        (-42.799, 30.28384733, -23.749),
        (-47.889120602, 43.296879398, -23.749),
        (-34.925, 44.45, -23.749),
        (-38.862, 37.366923665, -23.749),
        (-46.736, 37.366923665, -23.749),
        (-23.114, 37.366923665, -23.749),
        (-27.051, 30.28384733, -23.749),
        (-21.960879398, 43.296879398, -23.749),
        (-30.988, 37.366923665, -23.749),
        (-57.719028395, 3.178309088, -23.749),
        (-34.925, 0, -23.749),
        (-19.082063244, 0.146612369, -23.749),
        (-50.767936756, 0.146612369, -23.749),
        (-69.85, 26.3525, -23.749),
        (-13.3985, 44.45, -23.749),
        (-2.231846327, 42.218153673, -23.749),
        (-67.618153673, 42.218153673, -23.749),
        (0, 26.3525, -23.749),
    ]]
    fillet(fillet4_edges, radius=FILLET4_R)


solid = part_2.part
